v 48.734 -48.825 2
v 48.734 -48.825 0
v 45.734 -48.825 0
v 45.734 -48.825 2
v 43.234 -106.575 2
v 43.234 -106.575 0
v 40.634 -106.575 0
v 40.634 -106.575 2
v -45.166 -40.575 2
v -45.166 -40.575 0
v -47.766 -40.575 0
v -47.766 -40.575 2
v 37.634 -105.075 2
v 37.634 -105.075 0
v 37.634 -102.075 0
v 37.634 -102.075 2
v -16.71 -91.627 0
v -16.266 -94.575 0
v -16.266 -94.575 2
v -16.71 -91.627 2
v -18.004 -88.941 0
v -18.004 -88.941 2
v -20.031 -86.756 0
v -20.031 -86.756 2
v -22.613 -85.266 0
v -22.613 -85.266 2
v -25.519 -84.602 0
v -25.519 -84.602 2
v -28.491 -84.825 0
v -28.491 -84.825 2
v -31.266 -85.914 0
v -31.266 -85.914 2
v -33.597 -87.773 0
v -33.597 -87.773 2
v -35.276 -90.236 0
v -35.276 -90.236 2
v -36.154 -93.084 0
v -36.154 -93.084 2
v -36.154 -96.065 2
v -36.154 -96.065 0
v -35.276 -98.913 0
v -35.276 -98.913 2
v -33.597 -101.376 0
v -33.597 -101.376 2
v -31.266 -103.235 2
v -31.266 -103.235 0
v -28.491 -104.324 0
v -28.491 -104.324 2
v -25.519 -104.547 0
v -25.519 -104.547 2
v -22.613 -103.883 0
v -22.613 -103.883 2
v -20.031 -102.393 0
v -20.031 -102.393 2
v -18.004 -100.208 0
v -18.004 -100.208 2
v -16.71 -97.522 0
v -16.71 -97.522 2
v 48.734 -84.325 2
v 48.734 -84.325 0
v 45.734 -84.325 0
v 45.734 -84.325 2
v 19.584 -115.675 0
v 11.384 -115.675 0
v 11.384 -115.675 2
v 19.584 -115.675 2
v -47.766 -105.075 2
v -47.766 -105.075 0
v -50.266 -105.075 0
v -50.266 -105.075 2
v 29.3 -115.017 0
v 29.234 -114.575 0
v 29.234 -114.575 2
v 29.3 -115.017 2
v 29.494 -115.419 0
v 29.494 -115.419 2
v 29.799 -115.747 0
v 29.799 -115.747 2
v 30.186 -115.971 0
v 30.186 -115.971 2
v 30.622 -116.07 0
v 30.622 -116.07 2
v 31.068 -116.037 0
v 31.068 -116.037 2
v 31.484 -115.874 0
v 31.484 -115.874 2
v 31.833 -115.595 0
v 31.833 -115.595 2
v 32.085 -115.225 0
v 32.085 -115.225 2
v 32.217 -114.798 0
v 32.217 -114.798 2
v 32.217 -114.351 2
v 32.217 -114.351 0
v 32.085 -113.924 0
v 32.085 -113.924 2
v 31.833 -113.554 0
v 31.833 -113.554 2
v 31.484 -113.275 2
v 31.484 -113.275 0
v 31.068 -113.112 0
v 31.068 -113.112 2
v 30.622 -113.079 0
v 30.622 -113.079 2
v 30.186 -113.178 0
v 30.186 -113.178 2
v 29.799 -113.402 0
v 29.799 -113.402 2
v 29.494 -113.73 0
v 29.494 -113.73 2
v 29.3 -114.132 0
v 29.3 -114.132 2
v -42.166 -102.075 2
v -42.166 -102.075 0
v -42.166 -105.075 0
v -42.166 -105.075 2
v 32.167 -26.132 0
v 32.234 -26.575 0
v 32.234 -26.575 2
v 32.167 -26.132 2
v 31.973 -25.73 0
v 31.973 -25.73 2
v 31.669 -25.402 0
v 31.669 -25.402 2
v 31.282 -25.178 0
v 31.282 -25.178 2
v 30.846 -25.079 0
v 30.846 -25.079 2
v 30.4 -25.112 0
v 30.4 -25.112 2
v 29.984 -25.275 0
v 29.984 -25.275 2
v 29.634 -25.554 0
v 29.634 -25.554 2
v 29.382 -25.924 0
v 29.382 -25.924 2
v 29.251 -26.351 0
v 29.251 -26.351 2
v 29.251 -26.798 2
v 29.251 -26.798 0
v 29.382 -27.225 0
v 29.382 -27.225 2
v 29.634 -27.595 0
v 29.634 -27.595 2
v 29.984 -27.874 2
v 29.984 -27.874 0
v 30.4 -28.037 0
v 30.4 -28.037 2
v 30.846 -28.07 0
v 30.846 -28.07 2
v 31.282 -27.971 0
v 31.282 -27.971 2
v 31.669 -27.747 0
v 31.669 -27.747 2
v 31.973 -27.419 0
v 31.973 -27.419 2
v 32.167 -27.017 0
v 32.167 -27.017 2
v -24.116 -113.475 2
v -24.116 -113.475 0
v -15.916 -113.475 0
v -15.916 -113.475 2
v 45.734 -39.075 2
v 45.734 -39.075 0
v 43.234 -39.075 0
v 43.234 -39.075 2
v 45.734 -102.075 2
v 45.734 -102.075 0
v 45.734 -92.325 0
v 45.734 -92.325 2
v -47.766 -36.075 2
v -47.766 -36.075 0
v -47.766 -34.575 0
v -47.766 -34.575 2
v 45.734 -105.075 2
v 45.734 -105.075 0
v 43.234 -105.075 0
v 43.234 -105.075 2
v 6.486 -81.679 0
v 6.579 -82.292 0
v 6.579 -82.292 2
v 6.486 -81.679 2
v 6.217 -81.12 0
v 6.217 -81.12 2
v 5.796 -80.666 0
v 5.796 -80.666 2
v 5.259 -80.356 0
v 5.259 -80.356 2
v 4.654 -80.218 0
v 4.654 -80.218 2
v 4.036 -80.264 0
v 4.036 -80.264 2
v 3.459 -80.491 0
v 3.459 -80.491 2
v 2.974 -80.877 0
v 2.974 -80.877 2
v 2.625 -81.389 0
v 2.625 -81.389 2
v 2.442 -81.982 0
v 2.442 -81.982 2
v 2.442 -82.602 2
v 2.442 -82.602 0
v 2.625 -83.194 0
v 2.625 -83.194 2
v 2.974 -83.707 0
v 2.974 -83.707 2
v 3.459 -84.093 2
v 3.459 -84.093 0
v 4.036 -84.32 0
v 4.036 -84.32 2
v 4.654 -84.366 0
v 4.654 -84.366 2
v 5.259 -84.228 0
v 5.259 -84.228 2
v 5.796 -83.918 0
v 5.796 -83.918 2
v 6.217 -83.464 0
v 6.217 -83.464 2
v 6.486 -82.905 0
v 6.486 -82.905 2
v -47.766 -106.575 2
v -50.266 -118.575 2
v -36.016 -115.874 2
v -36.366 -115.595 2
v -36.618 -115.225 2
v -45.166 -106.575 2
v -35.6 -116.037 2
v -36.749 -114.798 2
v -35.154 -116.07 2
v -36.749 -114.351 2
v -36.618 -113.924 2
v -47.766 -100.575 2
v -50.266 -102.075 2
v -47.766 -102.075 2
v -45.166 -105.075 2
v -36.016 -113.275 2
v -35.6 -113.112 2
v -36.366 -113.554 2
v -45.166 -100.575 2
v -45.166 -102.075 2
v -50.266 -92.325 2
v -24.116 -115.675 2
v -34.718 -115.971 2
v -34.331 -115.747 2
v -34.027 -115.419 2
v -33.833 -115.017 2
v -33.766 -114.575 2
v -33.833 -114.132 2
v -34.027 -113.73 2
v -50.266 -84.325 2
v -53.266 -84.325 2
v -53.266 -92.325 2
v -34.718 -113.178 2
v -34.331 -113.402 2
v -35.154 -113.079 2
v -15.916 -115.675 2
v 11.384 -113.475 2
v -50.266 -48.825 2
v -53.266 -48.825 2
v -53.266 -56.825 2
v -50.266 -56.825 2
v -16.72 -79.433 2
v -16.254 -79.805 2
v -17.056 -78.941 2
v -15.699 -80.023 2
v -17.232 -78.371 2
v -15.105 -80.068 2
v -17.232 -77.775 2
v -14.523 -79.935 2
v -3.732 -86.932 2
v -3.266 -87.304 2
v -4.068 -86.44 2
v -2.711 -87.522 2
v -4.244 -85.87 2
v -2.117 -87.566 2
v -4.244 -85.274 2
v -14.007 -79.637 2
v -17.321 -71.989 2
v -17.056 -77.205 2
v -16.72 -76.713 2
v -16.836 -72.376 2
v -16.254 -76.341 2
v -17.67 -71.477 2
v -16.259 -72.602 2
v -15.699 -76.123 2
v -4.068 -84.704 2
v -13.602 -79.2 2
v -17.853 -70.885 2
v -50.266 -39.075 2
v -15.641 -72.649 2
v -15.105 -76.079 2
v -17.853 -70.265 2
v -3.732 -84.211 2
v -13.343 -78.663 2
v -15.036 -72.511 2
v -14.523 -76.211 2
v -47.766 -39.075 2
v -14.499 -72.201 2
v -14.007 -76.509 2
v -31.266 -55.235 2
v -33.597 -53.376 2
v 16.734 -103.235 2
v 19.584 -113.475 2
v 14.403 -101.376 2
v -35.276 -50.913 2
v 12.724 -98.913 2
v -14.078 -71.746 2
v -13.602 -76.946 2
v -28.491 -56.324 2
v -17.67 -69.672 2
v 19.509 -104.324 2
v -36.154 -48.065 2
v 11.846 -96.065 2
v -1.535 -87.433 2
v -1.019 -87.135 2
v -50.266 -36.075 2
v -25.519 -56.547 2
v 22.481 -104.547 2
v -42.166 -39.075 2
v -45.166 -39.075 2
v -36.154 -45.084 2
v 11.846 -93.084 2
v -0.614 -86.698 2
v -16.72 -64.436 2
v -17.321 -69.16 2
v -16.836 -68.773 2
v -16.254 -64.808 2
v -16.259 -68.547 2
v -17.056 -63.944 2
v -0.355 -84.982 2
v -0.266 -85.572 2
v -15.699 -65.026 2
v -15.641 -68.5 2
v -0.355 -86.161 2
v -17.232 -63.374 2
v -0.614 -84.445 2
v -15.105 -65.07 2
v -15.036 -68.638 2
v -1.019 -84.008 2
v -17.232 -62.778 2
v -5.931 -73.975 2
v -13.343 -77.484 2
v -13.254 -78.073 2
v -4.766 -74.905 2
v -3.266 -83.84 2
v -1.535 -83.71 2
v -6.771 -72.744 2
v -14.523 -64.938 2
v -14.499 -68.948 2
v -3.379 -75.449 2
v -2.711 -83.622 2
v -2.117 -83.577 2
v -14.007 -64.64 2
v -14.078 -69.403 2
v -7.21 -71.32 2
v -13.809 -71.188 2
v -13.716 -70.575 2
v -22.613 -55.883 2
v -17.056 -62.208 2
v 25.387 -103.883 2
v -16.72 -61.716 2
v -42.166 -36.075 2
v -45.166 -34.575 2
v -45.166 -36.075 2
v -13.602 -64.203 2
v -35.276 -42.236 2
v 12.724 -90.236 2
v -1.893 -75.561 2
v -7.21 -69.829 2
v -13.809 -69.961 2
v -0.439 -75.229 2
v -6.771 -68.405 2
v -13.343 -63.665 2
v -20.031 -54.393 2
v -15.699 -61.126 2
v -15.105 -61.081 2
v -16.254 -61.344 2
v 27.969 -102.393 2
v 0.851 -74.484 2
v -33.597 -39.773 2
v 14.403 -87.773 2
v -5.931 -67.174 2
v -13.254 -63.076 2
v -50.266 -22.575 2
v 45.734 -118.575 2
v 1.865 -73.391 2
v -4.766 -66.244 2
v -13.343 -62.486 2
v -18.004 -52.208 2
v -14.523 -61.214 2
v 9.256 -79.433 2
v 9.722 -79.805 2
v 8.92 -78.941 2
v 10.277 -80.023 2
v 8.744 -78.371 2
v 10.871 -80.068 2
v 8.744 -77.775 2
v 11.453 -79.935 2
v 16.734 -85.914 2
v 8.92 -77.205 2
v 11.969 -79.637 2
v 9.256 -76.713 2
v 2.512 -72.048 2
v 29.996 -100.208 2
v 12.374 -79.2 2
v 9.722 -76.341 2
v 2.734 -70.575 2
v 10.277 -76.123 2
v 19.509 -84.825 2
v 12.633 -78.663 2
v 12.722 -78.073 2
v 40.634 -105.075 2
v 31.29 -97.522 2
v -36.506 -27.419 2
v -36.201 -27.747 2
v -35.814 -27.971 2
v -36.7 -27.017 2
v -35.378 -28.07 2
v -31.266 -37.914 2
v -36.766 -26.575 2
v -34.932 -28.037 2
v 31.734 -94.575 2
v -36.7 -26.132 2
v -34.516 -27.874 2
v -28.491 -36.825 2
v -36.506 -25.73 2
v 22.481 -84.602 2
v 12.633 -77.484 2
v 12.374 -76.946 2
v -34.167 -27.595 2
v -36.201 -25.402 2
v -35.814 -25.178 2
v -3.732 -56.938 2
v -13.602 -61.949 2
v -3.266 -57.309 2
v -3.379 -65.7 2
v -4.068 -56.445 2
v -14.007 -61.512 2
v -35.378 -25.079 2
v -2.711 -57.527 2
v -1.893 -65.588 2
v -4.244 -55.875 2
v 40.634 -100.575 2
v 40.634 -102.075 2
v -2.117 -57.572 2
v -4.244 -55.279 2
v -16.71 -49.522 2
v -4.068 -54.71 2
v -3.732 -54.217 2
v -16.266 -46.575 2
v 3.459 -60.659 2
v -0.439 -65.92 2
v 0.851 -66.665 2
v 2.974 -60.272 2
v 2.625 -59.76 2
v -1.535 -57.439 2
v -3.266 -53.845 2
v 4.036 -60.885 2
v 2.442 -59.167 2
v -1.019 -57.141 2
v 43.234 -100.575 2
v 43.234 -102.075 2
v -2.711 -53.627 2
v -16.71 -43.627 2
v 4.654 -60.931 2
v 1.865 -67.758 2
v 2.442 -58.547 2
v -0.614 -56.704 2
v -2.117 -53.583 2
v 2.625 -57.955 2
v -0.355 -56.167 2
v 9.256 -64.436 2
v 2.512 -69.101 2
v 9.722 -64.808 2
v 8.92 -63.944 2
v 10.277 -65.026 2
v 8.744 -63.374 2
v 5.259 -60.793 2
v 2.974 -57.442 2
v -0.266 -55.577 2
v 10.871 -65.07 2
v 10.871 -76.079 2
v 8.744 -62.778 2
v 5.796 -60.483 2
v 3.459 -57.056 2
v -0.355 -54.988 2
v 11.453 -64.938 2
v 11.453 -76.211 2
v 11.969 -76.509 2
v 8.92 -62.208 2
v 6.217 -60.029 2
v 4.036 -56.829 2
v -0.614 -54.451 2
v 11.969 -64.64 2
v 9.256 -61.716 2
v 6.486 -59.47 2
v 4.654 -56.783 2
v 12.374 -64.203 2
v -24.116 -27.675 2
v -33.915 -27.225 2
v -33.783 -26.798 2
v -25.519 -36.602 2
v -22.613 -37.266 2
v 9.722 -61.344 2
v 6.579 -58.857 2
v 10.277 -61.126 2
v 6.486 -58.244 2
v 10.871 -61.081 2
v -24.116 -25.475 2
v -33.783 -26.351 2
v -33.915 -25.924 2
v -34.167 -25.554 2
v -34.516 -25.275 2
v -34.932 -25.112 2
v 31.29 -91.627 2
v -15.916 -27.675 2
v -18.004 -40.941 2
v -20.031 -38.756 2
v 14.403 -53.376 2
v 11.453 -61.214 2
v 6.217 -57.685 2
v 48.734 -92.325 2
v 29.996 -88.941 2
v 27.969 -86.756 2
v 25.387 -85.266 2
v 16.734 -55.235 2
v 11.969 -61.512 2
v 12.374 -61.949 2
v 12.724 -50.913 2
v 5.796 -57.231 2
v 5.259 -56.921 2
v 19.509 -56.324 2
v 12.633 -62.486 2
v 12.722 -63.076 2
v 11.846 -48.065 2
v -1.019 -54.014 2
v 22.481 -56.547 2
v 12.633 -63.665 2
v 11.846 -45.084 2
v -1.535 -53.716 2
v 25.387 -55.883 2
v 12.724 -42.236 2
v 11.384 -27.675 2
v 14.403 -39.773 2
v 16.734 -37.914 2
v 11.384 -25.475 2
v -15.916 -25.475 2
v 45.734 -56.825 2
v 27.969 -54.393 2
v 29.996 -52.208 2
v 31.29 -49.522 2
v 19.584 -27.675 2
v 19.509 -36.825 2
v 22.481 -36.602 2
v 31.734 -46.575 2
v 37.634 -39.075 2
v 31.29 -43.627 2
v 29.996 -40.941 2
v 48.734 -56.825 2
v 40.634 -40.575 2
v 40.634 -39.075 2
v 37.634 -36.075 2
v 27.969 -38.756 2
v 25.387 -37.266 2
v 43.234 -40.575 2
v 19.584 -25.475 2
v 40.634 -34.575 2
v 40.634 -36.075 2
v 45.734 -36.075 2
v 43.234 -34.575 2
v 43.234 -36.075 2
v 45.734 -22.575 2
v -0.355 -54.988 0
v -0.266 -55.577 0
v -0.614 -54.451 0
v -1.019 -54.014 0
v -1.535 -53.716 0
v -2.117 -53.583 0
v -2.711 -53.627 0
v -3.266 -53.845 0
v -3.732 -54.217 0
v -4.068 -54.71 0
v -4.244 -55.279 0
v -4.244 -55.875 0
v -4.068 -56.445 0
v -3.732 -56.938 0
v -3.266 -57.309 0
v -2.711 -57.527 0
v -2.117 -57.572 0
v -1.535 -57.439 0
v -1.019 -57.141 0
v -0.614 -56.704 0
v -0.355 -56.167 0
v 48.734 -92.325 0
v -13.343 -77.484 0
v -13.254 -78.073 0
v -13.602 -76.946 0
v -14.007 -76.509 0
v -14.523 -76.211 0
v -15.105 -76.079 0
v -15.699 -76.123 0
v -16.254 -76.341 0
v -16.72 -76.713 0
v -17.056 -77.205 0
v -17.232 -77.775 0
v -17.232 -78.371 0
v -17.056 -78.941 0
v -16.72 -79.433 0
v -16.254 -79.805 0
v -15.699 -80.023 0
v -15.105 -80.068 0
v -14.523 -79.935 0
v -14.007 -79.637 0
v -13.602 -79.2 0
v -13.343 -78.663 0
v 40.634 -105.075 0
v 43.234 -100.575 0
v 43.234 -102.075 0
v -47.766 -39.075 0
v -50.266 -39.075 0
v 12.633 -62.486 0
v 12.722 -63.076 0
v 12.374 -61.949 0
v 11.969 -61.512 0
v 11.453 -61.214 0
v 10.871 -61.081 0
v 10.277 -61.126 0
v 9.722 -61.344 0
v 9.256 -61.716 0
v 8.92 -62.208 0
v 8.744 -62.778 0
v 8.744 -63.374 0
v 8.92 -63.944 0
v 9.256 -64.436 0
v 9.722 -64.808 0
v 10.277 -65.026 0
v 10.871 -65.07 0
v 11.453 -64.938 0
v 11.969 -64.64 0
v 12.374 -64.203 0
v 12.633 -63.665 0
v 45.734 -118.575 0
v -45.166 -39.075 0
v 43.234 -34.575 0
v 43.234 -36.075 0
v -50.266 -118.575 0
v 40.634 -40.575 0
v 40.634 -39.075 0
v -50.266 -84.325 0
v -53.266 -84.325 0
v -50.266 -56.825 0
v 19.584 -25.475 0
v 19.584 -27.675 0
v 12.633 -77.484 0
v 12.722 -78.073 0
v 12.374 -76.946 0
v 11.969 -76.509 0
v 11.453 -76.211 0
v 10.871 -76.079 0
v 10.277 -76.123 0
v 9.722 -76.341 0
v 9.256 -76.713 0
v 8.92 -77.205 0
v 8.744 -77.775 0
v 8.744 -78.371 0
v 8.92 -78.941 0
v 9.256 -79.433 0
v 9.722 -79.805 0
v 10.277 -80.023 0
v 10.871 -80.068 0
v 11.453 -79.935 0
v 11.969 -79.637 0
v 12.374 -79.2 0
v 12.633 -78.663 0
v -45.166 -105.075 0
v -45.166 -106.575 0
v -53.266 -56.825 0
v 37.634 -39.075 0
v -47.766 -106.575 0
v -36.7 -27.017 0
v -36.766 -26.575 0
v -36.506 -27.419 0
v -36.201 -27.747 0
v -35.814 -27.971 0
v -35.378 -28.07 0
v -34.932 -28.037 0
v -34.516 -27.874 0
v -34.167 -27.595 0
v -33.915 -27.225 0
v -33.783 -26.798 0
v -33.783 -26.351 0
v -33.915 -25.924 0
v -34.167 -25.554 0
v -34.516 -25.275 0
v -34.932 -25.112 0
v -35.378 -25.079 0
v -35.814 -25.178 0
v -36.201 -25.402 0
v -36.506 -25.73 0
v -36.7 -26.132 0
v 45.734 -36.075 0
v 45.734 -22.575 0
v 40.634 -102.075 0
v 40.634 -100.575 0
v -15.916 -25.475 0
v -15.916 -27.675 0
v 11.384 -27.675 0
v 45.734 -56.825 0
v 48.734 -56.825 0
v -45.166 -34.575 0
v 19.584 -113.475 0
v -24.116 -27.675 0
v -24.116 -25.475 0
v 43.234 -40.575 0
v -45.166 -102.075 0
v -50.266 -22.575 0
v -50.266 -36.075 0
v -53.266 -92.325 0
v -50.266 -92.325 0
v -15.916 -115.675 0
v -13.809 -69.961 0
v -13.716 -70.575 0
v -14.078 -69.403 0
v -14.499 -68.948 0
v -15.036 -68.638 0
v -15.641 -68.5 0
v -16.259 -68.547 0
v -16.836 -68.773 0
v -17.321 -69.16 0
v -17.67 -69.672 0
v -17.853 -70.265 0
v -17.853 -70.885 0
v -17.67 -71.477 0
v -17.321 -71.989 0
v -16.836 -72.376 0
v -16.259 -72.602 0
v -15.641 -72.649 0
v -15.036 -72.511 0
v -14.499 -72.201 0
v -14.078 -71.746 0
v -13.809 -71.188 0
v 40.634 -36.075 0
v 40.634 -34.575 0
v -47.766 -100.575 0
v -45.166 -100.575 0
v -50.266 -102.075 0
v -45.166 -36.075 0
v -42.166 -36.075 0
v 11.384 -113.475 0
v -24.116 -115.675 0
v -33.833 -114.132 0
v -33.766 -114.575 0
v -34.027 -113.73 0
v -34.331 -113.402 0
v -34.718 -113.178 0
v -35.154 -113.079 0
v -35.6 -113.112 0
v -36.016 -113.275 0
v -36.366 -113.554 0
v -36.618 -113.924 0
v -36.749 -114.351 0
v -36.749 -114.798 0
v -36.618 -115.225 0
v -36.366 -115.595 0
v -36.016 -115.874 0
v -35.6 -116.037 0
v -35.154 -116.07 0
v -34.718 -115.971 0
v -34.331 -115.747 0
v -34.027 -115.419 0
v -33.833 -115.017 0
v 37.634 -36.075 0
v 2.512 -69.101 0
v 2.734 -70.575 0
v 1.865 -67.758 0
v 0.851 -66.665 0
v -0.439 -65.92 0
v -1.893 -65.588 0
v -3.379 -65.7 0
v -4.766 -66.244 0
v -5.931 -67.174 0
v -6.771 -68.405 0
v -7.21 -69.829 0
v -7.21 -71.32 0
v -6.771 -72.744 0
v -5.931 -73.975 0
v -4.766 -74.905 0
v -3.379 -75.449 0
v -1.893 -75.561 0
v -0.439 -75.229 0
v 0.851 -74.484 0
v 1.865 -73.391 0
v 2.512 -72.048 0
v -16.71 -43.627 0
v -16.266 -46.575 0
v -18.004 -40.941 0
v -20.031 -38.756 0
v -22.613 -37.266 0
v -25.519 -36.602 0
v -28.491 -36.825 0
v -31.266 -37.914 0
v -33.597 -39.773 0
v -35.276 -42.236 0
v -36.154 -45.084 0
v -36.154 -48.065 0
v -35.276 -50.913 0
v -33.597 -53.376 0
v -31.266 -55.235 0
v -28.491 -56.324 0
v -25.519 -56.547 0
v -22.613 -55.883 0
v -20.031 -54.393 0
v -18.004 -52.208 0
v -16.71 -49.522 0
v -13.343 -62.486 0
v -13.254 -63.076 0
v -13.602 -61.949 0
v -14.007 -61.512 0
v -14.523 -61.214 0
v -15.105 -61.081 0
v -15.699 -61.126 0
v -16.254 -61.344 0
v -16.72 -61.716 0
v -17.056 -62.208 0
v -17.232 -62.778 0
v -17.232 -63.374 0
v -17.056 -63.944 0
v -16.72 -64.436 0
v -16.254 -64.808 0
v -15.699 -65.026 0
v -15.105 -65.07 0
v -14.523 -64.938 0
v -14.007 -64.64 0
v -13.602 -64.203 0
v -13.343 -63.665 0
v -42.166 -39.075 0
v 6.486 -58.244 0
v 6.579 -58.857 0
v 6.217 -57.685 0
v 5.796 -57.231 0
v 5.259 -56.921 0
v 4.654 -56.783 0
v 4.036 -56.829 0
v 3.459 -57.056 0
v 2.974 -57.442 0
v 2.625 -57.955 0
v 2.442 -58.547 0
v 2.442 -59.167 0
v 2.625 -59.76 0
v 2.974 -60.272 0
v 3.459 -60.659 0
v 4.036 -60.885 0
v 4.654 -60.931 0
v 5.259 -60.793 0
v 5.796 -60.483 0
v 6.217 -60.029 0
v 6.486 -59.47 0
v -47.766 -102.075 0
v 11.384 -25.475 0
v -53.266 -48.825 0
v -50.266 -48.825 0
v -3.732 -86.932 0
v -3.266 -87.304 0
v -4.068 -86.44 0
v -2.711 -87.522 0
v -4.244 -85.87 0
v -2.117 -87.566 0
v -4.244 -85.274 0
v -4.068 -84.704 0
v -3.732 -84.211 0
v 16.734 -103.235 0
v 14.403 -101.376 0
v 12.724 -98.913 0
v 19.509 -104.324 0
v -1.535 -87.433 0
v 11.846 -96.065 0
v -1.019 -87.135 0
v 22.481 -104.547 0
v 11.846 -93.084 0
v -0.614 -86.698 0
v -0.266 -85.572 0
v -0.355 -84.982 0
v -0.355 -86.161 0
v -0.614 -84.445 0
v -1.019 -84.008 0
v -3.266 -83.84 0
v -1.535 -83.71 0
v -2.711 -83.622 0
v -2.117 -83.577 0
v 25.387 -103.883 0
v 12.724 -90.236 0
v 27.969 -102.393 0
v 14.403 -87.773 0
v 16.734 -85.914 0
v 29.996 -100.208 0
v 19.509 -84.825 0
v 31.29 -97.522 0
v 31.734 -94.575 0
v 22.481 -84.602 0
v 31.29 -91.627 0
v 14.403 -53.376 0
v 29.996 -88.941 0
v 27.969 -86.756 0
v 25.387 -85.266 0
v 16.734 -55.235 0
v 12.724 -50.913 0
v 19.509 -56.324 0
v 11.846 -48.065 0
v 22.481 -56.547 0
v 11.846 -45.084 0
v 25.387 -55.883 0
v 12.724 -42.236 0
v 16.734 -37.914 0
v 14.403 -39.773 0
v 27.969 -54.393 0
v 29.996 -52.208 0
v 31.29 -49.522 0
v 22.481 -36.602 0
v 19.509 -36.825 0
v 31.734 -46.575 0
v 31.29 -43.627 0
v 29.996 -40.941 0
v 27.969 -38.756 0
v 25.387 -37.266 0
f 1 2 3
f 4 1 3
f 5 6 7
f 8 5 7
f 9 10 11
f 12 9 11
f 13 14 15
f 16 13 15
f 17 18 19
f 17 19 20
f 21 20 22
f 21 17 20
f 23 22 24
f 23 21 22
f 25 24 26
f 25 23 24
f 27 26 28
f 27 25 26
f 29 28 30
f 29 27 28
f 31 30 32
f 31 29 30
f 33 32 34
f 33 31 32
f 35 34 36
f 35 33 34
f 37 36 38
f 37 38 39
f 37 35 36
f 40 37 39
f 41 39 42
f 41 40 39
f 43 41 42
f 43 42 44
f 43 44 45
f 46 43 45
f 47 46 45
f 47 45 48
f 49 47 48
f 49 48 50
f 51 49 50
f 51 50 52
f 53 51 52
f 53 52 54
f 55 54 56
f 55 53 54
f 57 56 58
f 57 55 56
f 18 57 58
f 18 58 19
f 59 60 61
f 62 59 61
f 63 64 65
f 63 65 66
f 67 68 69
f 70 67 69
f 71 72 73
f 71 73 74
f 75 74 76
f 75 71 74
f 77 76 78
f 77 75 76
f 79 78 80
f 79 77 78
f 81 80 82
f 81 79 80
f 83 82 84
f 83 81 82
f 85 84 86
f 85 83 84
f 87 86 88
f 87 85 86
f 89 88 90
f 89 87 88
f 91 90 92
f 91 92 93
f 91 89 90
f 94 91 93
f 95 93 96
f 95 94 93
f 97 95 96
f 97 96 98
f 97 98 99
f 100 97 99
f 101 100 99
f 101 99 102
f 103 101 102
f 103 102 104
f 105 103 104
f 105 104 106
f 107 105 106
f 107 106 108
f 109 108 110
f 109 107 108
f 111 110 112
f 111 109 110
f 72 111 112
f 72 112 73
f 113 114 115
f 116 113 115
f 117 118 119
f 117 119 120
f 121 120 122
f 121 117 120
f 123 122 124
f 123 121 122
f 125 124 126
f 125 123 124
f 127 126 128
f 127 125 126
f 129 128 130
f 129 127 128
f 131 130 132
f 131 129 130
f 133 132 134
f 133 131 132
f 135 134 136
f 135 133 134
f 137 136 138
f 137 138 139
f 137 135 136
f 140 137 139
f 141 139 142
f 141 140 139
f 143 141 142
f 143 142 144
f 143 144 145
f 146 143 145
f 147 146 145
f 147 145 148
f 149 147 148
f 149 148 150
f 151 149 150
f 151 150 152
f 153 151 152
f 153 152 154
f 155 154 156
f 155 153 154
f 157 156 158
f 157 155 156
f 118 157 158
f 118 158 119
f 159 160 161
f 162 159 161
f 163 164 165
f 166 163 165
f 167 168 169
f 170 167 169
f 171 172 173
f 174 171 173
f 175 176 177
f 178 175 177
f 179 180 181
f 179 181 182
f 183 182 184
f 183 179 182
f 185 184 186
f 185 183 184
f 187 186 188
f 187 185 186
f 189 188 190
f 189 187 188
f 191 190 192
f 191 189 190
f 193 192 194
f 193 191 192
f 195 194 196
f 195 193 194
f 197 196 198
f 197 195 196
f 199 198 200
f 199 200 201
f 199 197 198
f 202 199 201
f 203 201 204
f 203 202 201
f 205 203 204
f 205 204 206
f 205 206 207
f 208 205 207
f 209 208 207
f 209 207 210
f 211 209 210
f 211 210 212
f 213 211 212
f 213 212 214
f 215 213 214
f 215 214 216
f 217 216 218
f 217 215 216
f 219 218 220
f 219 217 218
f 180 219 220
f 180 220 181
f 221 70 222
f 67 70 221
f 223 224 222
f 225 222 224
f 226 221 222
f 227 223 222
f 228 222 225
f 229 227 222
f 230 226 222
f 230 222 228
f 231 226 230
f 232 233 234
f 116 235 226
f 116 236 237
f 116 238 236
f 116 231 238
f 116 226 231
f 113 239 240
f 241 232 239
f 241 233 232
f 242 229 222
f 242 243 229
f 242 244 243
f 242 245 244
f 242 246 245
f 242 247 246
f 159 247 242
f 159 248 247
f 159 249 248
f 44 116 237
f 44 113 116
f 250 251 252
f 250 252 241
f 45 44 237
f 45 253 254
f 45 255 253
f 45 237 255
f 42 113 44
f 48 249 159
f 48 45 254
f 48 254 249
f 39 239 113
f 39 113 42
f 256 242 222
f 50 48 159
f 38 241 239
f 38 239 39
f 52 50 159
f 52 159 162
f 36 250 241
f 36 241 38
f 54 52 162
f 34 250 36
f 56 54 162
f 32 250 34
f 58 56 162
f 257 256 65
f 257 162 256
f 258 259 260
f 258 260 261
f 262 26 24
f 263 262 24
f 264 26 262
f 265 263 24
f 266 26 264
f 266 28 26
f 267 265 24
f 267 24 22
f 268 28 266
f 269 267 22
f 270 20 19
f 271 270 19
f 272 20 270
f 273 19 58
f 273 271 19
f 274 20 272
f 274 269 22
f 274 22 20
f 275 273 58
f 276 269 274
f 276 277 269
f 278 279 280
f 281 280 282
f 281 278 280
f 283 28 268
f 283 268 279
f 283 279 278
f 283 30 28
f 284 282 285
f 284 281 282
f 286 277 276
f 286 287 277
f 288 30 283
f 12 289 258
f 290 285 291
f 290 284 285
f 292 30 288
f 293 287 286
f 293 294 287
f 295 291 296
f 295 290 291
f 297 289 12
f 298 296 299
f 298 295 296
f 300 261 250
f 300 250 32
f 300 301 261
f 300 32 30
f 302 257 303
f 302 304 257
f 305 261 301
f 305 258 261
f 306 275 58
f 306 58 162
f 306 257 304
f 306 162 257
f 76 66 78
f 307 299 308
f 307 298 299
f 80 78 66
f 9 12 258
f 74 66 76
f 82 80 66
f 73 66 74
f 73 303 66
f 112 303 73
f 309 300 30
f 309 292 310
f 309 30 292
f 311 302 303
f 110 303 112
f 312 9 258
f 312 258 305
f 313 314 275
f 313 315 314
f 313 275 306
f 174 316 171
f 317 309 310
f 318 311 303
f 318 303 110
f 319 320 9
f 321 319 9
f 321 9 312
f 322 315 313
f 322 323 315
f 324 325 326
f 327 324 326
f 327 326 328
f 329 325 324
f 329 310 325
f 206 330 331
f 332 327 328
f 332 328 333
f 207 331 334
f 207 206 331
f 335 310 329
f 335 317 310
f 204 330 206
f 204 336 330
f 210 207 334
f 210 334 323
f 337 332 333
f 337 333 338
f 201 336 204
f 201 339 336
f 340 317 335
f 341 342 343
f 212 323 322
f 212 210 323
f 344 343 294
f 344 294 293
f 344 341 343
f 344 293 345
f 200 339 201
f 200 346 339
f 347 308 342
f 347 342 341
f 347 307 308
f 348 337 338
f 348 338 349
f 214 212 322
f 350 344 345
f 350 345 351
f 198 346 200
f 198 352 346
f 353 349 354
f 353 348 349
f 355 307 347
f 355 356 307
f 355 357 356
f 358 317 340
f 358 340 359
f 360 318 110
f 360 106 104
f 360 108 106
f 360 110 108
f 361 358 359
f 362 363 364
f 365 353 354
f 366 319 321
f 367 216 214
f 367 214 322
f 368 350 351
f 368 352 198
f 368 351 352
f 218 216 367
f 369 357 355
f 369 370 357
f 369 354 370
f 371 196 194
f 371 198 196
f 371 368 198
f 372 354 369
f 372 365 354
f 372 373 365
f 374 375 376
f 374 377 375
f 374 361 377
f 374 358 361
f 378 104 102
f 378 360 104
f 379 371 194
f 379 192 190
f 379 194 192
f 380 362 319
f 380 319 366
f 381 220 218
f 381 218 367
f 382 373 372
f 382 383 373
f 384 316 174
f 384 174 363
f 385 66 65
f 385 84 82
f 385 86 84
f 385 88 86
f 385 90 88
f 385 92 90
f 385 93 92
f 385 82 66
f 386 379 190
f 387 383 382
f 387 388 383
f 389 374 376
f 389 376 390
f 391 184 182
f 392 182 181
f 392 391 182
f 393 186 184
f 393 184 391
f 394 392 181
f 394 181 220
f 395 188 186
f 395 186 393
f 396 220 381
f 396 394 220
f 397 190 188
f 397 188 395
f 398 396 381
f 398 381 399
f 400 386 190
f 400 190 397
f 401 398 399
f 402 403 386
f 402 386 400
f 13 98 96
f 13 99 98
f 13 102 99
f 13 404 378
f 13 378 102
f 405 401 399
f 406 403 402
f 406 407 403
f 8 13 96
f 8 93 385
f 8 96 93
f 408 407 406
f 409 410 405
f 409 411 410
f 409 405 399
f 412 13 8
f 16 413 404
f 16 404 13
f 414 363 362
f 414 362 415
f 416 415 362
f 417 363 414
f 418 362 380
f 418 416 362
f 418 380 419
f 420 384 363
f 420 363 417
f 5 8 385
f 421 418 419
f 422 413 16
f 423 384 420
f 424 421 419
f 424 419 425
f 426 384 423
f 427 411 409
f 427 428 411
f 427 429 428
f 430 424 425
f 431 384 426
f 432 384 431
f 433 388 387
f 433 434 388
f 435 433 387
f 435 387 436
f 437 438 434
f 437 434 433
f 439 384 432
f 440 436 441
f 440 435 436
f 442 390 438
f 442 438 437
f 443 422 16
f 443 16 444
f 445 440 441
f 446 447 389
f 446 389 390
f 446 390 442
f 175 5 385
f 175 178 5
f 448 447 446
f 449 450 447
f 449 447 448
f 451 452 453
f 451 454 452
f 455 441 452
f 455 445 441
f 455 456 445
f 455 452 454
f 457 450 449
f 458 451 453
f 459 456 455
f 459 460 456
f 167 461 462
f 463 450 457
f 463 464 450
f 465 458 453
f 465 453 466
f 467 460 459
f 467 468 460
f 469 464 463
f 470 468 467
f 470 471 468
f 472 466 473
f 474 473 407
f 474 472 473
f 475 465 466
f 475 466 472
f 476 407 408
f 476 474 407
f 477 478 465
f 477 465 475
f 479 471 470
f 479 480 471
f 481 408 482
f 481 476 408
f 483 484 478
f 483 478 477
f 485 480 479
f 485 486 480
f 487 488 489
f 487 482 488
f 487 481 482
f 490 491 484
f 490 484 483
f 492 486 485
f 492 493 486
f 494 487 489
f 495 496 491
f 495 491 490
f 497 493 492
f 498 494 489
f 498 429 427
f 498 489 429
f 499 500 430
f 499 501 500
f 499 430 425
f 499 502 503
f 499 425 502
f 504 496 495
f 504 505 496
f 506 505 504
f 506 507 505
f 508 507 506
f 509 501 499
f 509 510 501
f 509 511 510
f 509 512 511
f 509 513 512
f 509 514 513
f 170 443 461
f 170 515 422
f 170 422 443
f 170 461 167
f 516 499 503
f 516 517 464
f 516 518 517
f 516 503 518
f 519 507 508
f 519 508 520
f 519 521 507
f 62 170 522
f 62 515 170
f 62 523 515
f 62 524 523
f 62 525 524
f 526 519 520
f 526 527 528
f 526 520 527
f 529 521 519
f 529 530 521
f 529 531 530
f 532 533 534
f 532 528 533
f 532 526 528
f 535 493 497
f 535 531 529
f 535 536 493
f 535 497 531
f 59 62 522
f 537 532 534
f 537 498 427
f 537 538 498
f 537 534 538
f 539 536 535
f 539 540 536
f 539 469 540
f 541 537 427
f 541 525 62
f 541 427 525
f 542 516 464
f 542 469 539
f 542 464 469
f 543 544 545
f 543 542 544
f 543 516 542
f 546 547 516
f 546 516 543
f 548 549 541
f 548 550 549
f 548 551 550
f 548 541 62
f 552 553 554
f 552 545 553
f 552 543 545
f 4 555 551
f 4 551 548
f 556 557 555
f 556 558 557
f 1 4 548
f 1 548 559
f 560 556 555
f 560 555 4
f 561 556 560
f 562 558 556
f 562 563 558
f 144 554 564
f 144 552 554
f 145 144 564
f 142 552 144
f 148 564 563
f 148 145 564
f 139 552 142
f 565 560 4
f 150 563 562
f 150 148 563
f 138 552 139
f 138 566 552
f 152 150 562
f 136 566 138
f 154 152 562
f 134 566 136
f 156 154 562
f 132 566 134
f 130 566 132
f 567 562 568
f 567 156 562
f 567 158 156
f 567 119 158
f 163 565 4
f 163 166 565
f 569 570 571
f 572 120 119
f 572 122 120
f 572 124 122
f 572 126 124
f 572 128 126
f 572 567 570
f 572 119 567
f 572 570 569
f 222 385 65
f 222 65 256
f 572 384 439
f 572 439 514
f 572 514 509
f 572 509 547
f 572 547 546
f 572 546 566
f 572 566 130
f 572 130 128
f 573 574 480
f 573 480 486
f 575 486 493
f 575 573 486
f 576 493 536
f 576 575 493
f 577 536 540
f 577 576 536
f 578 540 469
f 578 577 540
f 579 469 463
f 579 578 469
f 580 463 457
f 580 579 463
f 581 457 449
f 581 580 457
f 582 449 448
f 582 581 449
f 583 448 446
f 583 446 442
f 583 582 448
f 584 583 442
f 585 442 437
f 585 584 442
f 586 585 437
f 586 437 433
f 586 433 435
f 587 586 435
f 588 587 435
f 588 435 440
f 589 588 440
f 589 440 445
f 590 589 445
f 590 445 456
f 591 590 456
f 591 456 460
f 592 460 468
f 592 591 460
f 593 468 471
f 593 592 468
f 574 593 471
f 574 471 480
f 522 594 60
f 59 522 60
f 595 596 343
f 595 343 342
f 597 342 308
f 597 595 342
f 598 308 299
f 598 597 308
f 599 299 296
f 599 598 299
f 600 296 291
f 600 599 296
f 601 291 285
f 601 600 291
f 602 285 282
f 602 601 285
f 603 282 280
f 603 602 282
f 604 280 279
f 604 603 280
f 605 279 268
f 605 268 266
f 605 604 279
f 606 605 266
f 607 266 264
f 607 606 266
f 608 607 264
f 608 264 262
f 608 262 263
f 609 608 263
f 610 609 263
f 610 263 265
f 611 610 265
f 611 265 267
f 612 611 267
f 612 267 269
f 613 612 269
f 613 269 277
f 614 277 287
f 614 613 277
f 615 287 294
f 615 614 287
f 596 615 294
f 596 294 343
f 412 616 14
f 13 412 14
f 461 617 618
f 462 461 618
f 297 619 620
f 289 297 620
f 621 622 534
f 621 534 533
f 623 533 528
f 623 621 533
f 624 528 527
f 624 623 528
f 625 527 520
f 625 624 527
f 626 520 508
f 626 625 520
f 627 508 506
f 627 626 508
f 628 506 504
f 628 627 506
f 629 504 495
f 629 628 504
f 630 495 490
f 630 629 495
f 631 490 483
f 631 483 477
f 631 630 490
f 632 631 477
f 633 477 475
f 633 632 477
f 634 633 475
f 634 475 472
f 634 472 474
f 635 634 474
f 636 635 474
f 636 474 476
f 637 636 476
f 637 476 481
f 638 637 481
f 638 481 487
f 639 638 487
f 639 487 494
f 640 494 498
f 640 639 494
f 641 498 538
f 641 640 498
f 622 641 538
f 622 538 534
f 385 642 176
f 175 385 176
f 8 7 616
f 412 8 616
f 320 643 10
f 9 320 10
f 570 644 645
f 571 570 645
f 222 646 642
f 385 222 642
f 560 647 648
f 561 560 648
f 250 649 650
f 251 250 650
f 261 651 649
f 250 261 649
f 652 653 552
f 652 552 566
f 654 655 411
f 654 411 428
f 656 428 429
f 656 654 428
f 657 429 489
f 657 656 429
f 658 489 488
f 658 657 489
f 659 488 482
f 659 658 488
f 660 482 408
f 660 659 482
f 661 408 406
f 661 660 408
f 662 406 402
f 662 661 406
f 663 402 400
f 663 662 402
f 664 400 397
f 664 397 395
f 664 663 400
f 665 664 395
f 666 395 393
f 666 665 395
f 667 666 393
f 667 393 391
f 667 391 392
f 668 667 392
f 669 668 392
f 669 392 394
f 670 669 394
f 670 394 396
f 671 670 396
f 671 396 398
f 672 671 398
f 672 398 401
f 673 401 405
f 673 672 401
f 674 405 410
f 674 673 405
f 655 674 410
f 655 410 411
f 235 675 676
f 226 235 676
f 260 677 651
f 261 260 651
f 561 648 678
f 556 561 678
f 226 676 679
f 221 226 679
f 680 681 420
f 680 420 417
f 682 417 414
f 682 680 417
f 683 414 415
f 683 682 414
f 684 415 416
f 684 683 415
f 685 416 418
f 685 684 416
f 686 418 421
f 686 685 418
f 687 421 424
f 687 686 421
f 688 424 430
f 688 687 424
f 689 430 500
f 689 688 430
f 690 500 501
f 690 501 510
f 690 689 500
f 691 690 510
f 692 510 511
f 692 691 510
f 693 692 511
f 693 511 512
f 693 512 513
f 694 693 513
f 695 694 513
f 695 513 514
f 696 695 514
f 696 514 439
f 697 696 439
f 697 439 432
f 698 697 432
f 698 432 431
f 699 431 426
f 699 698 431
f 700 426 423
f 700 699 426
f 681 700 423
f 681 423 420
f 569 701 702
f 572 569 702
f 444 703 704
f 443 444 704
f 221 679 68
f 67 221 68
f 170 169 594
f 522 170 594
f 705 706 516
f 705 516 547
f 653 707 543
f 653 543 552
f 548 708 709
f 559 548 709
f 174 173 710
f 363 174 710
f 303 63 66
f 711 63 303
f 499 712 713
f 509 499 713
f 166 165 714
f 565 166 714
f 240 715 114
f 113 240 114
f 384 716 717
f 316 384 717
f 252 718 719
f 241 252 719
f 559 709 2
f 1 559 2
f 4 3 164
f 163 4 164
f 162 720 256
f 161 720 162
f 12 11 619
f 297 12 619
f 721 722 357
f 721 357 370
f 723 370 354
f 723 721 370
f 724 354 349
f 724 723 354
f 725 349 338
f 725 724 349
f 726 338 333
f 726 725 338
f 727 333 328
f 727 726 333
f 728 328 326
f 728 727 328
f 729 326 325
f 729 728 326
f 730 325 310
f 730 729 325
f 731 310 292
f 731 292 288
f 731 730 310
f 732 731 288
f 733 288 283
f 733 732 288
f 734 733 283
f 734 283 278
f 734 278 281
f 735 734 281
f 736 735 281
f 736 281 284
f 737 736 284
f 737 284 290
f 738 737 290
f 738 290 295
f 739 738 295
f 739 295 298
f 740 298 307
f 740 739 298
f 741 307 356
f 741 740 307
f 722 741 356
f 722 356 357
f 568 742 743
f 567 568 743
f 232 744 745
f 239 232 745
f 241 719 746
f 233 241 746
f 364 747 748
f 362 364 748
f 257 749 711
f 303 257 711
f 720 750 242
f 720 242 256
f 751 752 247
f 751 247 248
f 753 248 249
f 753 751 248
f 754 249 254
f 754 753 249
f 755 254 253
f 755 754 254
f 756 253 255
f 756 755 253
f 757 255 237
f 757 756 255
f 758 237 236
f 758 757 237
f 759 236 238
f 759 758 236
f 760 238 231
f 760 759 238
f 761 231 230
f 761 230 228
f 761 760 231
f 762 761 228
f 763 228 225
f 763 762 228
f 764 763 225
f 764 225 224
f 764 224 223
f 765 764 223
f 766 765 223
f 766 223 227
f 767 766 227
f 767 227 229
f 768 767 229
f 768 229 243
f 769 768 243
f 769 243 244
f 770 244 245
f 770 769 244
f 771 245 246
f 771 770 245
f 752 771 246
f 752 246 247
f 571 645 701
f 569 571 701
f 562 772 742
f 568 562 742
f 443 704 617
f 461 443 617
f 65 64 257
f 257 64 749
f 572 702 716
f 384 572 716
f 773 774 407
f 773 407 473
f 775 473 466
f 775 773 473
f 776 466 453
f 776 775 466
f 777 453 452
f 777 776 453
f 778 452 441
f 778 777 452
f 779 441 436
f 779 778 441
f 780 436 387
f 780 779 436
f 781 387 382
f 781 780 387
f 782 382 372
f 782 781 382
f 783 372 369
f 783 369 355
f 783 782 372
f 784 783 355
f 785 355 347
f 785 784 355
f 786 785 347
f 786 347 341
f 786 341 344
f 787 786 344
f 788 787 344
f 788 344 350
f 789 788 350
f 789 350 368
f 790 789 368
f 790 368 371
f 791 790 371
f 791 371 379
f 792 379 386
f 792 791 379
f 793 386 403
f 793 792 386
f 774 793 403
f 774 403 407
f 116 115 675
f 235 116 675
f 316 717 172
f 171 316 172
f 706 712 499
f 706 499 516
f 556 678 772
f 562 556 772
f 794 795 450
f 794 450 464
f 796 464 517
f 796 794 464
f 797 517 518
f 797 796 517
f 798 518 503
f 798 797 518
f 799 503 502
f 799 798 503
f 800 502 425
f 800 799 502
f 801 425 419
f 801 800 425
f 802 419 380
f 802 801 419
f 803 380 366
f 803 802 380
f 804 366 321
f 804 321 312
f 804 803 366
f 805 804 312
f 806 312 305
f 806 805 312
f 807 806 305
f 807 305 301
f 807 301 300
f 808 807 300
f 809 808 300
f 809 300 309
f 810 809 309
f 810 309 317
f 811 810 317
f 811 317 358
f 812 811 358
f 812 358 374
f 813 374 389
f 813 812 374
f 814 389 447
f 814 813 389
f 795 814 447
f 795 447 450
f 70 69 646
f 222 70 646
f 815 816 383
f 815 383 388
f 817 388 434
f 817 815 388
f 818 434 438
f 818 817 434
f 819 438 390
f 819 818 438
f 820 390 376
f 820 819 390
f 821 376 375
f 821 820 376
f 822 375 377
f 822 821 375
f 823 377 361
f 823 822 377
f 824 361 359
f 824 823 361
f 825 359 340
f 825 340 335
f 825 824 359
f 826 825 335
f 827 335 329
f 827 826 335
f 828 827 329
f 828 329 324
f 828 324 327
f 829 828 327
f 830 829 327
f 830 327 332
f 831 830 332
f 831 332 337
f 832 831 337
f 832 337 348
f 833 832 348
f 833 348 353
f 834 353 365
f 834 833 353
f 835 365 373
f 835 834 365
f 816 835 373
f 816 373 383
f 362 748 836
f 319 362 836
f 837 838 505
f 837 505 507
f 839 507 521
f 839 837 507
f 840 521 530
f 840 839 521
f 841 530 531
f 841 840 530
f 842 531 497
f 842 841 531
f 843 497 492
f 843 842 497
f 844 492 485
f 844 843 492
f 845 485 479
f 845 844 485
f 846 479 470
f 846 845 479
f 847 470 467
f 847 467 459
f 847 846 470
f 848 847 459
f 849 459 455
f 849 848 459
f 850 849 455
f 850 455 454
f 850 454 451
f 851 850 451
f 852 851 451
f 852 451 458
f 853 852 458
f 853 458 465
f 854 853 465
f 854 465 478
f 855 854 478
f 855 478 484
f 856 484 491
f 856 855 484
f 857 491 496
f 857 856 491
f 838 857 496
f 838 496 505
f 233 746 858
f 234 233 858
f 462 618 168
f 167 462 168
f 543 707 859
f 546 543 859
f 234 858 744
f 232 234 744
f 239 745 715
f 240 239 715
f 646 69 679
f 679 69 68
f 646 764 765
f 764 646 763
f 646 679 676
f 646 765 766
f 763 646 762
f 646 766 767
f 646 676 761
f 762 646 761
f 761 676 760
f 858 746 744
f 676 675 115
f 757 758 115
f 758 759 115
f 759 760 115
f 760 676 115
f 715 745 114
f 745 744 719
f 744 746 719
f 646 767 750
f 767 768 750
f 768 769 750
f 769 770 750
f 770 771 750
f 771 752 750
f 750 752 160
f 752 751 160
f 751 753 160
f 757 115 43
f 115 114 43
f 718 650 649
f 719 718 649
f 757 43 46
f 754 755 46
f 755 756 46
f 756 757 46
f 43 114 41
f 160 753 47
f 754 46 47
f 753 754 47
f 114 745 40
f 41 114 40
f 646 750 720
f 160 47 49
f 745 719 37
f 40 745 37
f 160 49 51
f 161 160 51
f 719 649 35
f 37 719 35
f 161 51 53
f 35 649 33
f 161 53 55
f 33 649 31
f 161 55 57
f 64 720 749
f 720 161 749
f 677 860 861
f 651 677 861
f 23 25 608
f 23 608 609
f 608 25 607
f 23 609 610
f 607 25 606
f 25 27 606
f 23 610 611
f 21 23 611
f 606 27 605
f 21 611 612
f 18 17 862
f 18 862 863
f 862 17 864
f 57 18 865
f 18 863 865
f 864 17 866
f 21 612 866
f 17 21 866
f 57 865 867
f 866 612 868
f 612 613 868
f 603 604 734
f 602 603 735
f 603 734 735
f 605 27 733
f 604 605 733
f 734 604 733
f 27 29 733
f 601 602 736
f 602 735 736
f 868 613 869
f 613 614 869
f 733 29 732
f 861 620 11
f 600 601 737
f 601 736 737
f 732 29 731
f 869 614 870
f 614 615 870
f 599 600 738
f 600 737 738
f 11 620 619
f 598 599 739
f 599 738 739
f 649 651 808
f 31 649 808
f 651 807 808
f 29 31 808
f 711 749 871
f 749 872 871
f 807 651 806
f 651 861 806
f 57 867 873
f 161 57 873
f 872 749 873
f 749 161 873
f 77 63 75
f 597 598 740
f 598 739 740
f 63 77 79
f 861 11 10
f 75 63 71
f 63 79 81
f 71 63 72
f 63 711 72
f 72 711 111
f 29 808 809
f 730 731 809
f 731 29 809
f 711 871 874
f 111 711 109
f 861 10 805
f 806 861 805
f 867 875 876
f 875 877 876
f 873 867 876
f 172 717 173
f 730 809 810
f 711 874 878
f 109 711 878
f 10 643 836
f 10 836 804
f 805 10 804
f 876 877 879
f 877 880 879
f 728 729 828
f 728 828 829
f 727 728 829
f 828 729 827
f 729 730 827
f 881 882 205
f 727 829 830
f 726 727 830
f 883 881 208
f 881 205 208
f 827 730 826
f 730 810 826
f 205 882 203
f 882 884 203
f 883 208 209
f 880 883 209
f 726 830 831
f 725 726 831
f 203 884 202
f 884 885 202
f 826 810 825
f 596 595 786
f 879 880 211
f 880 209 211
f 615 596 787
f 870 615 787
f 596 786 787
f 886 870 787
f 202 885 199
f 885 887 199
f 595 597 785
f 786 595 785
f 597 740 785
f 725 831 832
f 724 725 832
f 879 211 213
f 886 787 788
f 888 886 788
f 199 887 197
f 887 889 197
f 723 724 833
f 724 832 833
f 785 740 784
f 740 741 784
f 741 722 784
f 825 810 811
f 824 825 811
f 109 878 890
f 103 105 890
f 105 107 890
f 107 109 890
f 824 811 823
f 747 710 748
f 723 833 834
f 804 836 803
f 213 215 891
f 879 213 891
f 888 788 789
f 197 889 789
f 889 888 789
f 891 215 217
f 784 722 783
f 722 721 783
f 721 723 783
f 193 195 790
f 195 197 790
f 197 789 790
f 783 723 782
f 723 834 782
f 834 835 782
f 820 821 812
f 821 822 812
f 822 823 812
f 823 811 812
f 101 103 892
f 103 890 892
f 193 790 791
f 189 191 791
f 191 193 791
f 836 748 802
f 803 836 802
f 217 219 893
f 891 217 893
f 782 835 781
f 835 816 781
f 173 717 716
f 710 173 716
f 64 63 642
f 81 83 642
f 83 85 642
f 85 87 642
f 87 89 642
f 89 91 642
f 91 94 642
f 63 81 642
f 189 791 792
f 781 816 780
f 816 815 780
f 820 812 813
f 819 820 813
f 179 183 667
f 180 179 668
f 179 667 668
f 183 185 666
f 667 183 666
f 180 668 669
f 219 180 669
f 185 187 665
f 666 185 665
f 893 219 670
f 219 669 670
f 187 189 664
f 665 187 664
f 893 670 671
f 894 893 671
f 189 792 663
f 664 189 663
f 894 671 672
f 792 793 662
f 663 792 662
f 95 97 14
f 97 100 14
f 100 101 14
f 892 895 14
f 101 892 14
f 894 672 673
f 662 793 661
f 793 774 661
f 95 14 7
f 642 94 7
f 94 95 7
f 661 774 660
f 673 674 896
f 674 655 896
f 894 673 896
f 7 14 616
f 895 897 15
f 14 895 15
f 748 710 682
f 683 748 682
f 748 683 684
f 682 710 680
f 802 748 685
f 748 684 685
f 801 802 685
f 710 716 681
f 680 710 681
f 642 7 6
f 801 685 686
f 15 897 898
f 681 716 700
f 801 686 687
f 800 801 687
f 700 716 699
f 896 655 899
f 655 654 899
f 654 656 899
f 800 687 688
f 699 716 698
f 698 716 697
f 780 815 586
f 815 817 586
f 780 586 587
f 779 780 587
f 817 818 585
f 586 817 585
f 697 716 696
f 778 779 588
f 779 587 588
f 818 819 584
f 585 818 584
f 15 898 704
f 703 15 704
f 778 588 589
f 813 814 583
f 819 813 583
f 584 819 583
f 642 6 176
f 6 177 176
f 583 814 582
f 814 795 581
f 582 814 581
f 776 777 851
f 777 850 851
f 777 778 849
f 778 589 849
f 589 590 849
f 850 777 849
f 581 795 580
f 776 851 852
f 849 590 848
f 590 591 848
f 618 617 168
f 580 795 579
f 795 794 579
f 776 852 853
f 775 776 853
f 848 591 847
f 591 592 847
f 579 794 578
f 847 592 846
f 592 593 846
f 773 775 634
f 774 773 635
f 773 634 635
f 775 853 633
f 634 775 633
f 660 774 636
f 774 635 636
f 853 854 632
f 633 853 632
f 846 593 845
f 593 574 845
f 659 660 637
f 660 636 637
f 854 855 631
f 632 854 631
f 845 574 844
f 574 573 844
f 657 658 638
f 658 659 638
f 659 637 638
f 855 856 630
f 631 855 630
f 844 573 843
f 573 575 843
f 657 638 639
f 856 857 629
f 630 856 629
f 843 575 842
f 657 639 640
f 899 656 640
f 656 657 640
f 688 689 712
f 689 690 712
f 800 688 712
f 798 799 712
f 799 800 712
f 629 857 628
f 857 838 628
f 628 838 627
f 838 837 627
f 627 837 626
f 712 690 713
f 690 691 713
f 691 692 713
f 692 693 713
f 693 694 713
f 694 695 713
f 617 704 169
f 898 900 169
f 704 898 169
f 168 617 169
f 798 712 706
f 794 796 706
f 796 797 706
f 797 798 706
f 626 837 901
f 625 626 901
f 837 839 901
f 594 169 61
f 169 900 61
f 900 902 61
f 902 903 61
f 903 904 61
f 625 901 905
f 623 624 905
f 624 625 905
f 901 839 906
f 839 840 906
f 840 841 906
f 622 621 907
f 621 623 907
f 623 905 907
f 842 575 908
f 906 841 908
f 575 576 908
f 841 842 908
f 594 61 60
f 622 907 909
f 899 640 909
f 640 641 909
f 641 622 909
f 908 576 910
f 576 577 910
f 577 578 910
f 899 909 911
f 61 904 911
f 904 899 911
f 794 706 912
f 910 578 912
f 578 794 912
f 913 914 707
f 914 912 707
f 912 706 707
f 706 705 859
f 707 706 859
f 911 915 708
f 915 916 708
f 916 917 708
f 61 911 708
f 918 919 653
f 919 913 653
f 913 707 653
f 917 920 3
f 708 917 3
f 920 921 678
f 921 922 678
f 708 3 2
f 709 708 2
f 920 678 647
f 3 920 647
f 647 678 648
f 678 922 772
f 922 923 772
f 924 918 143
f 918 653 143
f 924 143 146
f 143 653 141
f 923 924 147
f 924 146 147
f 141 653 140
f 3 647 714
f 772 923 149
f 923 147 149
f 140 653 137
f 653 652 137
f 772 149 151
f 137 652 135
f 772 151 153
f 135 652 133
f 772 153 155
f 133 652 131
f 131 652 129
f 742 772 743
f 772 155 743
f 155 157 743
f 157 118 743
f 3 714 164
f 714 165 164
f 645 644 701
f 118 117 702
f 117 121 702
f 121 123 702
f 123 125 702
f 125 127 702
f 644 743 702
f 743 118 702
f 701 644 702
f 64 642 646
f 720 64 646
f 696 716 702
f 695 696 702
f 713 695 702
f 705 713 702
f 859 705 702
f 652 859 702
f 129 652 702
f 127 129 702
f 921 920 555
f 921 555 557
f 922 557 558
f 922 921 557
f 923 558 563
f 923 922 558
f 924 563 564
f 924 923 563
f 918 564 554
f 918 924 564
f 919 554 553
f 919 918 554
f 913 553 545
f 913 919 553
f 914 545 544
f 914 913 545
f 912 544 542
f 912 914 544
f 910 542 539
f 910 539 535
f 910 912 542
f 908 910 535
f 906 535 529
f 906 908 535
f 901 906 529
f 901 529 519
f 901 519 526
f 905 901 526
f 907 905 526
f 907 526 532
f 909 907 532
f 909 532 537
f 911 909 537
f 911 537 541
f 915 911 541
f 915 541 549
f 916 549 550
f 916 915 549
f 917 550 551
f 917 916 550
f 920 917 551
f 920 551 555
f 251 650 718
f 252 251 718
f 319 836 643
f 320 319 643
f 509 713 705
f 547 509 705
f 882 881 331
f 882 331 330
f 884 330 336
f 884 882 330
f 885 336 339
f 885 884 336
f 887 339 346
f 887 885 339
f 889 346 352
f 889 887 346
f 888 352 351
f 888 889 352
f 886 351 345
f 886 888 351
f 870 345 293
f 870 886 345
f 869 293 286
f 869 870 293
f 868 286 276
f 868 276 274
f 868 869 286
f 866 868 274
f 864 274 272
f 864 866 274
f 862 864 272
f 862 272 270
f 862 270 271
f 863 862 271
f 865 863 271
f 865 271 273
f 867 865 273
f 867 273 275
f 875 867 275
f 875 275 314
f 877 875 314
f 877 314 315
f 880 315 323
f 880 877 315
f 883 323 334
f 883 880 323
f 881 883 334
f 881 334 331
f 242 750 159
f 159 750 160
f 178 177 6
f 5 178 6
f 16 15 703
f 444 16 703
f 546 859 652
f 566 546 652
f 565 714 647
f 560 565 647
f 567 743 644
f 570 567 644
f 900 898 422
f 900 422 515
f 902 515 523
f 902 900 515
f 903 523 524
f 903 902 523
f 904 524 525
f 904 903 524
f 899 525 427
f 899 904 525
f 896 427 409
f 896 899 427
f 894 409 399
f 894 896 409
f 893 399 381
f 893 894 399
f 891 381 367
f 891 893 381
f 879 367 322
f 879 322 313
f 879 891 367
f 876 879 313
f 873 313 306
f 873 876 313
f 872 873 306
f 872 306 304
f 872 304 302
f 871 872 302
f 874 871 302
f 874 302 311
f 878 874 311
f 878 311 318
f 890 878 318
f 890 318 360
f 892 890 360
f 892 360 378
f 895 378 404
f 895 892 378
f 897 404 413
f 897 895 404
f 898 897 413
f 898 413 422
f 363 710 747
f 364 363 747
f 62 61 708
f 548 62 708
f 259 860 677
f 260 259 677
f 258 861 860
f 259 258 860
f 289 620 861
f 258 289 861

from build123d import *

# Parameters (mm, degrees)
SKETCH_1_R      = 1.5
SKETCH_1_R_2    = 2
SKETCH_1_R_3    = 2.08
SKETCH_1_R_4    = 5
SKETCH_1_R_5    = 10
SKETCH_1_W      = 8.2
SKETCH_1_H      = 2.2
EXTRUDE_1_DEPTH = 2


with BuildPart() as part:
    # 草图1 → 凸台-拉伸1 (new body)
    with BuildSketch(Plane.XY):
        Polygon((-50.266155614, -92.324512395), (-50.266155614, -102.074512395), (-47.766155614, -102.074512395), (-47.766155614, -100.574512395), (-45.166155614, -100.574512395), (-45.166155614, -102.074512395), (-42.166155614, -102.074512395), (-42.166155614, -105.074512395), (-45.166155614, -105.074512395), (-45.166155614, -106.574512395), (-47.766155614, -106.574512395), (-47.766155614, -105.074512395), (-50.266155614, -105.074512395), (-50.266155614, -106.074512395), (-50.266155614, -118.574512395), (-2.266155614, -118.574512395), (45.733844386, -118.574512395), (45.733844386, -106.074512395), (45.733844386, -105.074512395), (43.233844386, -105.074512395), (43.233844386, -106.574512395), (40.633844386, -106.574512395), (40.633844386, -105.074512395), (37.633844386, -105.074512395), (37.633844386, -102.074512395), (40.633844386, -102.074512395), (40.633844386, -100.574512395), (43.233844386, -100.574512395), (43.233844386, -102.074512395), (45.733844386, -102.074512395), (45.733844386, -92.324512395), (48.733844386, -92.324512395), (48.733844386, -84.324512395), (45.733844386, -84.324512395), (45.733844386, -56.824512395), (48.733844386, -56.824512395), (48.733844386, -48.824512395), (45.733844386, -48.824512395), (45.733844386, -39.074512395), (43.233844386, -39.074512395), (43.233844386, -40.574512395), (40.633844386, -40.574512395), (40.633844386, -39.074512395), (37.633844386, -39.074512395), (37.633844386, -36.074512395), (40.633844386, -36.074512395), (40.633844386, -34.574512395), (43.233844386, -34.574512395), (43.233844386, -36.074512395), (45.733844386, -36.074512395), (45.733844386, -23.574512395), (45.733844386, -22.574512395), (-2.266155614, -22.574512395), (-50.266155614, -22.574512395), (-50.266155614, -23.574512395), (-50.266155614, -36.074512395), (-47.766155614, -36.074512395), (-47.766155614, -34.574512395), (-45.166155614, -34.574512395), (-45.166155614, -36.074512395), (-42.166155614, -36.074512395), (-42.166155614, -39.074512395), (-45.166155614, -39.074512395), (-45.166155614, -40.574512395), (-47.766155614, -40.574512395), (-47.766155614, -39.074512395), (-50.266155614, -39.074512395), (-50.266155614, -48.824512395), (-53.266155614, -48.824512395), (-53.266155614, -56.824512395), (-50.266155614, -56.824512395), (-50.266155614, -84.324512395), (-53.266155614, -84.324512395), (-53.266155614, -92.324512395), align=None)
        with Locations((-35.266155614, -114.574512396)):
            Circle(SKETCH_1_R, mode=Mode.SUBTRACT)
        with Locations(Location((30.733844386, -114.574512396, 0), (0, 0, 180))):
            Circle(SKETCH_1_R, mode=Mode.SUBTRACT)
        with Locations((30.733844386, -26.574512395)):
            Circle(SKETCH_1_R, mode=Mode.SUBTRACT)
        with Locations(Location((-35.266155614, -26.574512395, 0), (0, 0, 180))):
            Circle(SKETCH_1_R, mode=Mode.SUBTRACT)
        with Locations((-2.266155614, -85.571739483)):
            Circle(SKETCH_1_R_2, mode=Mode.SUBTRACT)
        with Locations((-15.254135258, -78.073125939)):
            Circle(SKETCH_1_R_2, mode=Mode.SUBTRACT)
        with Locations((-15.254135258, -63.075898852)):
            Circle(SKETCH_1_R_2, mode=Mode.SUBTRACT)
        with Locations((-2.266155614, -55.577285308)):
            Circle(SKETCH_1_R_2, mode=Mode.SUBTRACT)
        with Locations((10.721824031, -63.075898852)):
            Circle(SKETCH_1_R_2, mode=Mode.SUBTRACT)
        with Locations((10.721824031, -78.073125939)):
            Circle(SKETCH_1_R_2, mode=Mode.SUBTRACT)
        with Locations((-15.796155614, -70.574512395)):
            Circle(SKETCH_1_R_3, mode=Mode.SUBTRACT)
        with Locations((4.498844386, -58.857188682)):
            Circle(SKETCH_1_R_3, mode=Mode.SUBTRACT)
        with Locations((4.498844386, -82.291836109)):
            Circle(SKETCH_1_R_3, mode=Mode.SUBTRACT)
        with Locations((-2.266155614, -70.574512395)):
            Circle(SKETCH_1_R_4, mode=Mode.SUBTRACT)
        with Locations((-26.266155614, -46.574512395)):
            Circle(SKETCH_1_R_5, mode=Mode.SUBTRACT)
        with Locations((21.733844386, -46.574512395)):
            Circle(SKETCH_1_R_5, mode=Mode.SUBTRACT)
        with Locations((21.733844386, -94.574512395)):
            Circle(SKETCH_1_R_5, mode=Mode.SUBTRACT)
        with Locations((-26.266155614, -94.574512395)):
            Circle(SKETCH_1_R_5, mode=Mode.SUBTRACT)
        with Locations((-20.016155614, -114.574512396)):
            Rectangle(SKETCH_1_W, SKETCH_1_H, mode=Mode.SUBTRACT)
        with Locations((15.483844386, -114.574512396)):
            Rectangle(SKETCH_1_W, SKETCH_1_H, mode=Mode.SUBTRACT)
        with Locations((15.483844386, -26.574512395)):
            Rectangle(SKETCH_1_W, SKETCH_1_H, mode=Mode.SUBTRACT)
        with Locations((-20.016155614, -26.574512395)):
            Rectangle(SKETCH_1_W, SKETCH_1_H, mode=Mode.SUBTRACT)
    extrude(amount=EXTRUDE_1_DEPTH)


solid = part.part
